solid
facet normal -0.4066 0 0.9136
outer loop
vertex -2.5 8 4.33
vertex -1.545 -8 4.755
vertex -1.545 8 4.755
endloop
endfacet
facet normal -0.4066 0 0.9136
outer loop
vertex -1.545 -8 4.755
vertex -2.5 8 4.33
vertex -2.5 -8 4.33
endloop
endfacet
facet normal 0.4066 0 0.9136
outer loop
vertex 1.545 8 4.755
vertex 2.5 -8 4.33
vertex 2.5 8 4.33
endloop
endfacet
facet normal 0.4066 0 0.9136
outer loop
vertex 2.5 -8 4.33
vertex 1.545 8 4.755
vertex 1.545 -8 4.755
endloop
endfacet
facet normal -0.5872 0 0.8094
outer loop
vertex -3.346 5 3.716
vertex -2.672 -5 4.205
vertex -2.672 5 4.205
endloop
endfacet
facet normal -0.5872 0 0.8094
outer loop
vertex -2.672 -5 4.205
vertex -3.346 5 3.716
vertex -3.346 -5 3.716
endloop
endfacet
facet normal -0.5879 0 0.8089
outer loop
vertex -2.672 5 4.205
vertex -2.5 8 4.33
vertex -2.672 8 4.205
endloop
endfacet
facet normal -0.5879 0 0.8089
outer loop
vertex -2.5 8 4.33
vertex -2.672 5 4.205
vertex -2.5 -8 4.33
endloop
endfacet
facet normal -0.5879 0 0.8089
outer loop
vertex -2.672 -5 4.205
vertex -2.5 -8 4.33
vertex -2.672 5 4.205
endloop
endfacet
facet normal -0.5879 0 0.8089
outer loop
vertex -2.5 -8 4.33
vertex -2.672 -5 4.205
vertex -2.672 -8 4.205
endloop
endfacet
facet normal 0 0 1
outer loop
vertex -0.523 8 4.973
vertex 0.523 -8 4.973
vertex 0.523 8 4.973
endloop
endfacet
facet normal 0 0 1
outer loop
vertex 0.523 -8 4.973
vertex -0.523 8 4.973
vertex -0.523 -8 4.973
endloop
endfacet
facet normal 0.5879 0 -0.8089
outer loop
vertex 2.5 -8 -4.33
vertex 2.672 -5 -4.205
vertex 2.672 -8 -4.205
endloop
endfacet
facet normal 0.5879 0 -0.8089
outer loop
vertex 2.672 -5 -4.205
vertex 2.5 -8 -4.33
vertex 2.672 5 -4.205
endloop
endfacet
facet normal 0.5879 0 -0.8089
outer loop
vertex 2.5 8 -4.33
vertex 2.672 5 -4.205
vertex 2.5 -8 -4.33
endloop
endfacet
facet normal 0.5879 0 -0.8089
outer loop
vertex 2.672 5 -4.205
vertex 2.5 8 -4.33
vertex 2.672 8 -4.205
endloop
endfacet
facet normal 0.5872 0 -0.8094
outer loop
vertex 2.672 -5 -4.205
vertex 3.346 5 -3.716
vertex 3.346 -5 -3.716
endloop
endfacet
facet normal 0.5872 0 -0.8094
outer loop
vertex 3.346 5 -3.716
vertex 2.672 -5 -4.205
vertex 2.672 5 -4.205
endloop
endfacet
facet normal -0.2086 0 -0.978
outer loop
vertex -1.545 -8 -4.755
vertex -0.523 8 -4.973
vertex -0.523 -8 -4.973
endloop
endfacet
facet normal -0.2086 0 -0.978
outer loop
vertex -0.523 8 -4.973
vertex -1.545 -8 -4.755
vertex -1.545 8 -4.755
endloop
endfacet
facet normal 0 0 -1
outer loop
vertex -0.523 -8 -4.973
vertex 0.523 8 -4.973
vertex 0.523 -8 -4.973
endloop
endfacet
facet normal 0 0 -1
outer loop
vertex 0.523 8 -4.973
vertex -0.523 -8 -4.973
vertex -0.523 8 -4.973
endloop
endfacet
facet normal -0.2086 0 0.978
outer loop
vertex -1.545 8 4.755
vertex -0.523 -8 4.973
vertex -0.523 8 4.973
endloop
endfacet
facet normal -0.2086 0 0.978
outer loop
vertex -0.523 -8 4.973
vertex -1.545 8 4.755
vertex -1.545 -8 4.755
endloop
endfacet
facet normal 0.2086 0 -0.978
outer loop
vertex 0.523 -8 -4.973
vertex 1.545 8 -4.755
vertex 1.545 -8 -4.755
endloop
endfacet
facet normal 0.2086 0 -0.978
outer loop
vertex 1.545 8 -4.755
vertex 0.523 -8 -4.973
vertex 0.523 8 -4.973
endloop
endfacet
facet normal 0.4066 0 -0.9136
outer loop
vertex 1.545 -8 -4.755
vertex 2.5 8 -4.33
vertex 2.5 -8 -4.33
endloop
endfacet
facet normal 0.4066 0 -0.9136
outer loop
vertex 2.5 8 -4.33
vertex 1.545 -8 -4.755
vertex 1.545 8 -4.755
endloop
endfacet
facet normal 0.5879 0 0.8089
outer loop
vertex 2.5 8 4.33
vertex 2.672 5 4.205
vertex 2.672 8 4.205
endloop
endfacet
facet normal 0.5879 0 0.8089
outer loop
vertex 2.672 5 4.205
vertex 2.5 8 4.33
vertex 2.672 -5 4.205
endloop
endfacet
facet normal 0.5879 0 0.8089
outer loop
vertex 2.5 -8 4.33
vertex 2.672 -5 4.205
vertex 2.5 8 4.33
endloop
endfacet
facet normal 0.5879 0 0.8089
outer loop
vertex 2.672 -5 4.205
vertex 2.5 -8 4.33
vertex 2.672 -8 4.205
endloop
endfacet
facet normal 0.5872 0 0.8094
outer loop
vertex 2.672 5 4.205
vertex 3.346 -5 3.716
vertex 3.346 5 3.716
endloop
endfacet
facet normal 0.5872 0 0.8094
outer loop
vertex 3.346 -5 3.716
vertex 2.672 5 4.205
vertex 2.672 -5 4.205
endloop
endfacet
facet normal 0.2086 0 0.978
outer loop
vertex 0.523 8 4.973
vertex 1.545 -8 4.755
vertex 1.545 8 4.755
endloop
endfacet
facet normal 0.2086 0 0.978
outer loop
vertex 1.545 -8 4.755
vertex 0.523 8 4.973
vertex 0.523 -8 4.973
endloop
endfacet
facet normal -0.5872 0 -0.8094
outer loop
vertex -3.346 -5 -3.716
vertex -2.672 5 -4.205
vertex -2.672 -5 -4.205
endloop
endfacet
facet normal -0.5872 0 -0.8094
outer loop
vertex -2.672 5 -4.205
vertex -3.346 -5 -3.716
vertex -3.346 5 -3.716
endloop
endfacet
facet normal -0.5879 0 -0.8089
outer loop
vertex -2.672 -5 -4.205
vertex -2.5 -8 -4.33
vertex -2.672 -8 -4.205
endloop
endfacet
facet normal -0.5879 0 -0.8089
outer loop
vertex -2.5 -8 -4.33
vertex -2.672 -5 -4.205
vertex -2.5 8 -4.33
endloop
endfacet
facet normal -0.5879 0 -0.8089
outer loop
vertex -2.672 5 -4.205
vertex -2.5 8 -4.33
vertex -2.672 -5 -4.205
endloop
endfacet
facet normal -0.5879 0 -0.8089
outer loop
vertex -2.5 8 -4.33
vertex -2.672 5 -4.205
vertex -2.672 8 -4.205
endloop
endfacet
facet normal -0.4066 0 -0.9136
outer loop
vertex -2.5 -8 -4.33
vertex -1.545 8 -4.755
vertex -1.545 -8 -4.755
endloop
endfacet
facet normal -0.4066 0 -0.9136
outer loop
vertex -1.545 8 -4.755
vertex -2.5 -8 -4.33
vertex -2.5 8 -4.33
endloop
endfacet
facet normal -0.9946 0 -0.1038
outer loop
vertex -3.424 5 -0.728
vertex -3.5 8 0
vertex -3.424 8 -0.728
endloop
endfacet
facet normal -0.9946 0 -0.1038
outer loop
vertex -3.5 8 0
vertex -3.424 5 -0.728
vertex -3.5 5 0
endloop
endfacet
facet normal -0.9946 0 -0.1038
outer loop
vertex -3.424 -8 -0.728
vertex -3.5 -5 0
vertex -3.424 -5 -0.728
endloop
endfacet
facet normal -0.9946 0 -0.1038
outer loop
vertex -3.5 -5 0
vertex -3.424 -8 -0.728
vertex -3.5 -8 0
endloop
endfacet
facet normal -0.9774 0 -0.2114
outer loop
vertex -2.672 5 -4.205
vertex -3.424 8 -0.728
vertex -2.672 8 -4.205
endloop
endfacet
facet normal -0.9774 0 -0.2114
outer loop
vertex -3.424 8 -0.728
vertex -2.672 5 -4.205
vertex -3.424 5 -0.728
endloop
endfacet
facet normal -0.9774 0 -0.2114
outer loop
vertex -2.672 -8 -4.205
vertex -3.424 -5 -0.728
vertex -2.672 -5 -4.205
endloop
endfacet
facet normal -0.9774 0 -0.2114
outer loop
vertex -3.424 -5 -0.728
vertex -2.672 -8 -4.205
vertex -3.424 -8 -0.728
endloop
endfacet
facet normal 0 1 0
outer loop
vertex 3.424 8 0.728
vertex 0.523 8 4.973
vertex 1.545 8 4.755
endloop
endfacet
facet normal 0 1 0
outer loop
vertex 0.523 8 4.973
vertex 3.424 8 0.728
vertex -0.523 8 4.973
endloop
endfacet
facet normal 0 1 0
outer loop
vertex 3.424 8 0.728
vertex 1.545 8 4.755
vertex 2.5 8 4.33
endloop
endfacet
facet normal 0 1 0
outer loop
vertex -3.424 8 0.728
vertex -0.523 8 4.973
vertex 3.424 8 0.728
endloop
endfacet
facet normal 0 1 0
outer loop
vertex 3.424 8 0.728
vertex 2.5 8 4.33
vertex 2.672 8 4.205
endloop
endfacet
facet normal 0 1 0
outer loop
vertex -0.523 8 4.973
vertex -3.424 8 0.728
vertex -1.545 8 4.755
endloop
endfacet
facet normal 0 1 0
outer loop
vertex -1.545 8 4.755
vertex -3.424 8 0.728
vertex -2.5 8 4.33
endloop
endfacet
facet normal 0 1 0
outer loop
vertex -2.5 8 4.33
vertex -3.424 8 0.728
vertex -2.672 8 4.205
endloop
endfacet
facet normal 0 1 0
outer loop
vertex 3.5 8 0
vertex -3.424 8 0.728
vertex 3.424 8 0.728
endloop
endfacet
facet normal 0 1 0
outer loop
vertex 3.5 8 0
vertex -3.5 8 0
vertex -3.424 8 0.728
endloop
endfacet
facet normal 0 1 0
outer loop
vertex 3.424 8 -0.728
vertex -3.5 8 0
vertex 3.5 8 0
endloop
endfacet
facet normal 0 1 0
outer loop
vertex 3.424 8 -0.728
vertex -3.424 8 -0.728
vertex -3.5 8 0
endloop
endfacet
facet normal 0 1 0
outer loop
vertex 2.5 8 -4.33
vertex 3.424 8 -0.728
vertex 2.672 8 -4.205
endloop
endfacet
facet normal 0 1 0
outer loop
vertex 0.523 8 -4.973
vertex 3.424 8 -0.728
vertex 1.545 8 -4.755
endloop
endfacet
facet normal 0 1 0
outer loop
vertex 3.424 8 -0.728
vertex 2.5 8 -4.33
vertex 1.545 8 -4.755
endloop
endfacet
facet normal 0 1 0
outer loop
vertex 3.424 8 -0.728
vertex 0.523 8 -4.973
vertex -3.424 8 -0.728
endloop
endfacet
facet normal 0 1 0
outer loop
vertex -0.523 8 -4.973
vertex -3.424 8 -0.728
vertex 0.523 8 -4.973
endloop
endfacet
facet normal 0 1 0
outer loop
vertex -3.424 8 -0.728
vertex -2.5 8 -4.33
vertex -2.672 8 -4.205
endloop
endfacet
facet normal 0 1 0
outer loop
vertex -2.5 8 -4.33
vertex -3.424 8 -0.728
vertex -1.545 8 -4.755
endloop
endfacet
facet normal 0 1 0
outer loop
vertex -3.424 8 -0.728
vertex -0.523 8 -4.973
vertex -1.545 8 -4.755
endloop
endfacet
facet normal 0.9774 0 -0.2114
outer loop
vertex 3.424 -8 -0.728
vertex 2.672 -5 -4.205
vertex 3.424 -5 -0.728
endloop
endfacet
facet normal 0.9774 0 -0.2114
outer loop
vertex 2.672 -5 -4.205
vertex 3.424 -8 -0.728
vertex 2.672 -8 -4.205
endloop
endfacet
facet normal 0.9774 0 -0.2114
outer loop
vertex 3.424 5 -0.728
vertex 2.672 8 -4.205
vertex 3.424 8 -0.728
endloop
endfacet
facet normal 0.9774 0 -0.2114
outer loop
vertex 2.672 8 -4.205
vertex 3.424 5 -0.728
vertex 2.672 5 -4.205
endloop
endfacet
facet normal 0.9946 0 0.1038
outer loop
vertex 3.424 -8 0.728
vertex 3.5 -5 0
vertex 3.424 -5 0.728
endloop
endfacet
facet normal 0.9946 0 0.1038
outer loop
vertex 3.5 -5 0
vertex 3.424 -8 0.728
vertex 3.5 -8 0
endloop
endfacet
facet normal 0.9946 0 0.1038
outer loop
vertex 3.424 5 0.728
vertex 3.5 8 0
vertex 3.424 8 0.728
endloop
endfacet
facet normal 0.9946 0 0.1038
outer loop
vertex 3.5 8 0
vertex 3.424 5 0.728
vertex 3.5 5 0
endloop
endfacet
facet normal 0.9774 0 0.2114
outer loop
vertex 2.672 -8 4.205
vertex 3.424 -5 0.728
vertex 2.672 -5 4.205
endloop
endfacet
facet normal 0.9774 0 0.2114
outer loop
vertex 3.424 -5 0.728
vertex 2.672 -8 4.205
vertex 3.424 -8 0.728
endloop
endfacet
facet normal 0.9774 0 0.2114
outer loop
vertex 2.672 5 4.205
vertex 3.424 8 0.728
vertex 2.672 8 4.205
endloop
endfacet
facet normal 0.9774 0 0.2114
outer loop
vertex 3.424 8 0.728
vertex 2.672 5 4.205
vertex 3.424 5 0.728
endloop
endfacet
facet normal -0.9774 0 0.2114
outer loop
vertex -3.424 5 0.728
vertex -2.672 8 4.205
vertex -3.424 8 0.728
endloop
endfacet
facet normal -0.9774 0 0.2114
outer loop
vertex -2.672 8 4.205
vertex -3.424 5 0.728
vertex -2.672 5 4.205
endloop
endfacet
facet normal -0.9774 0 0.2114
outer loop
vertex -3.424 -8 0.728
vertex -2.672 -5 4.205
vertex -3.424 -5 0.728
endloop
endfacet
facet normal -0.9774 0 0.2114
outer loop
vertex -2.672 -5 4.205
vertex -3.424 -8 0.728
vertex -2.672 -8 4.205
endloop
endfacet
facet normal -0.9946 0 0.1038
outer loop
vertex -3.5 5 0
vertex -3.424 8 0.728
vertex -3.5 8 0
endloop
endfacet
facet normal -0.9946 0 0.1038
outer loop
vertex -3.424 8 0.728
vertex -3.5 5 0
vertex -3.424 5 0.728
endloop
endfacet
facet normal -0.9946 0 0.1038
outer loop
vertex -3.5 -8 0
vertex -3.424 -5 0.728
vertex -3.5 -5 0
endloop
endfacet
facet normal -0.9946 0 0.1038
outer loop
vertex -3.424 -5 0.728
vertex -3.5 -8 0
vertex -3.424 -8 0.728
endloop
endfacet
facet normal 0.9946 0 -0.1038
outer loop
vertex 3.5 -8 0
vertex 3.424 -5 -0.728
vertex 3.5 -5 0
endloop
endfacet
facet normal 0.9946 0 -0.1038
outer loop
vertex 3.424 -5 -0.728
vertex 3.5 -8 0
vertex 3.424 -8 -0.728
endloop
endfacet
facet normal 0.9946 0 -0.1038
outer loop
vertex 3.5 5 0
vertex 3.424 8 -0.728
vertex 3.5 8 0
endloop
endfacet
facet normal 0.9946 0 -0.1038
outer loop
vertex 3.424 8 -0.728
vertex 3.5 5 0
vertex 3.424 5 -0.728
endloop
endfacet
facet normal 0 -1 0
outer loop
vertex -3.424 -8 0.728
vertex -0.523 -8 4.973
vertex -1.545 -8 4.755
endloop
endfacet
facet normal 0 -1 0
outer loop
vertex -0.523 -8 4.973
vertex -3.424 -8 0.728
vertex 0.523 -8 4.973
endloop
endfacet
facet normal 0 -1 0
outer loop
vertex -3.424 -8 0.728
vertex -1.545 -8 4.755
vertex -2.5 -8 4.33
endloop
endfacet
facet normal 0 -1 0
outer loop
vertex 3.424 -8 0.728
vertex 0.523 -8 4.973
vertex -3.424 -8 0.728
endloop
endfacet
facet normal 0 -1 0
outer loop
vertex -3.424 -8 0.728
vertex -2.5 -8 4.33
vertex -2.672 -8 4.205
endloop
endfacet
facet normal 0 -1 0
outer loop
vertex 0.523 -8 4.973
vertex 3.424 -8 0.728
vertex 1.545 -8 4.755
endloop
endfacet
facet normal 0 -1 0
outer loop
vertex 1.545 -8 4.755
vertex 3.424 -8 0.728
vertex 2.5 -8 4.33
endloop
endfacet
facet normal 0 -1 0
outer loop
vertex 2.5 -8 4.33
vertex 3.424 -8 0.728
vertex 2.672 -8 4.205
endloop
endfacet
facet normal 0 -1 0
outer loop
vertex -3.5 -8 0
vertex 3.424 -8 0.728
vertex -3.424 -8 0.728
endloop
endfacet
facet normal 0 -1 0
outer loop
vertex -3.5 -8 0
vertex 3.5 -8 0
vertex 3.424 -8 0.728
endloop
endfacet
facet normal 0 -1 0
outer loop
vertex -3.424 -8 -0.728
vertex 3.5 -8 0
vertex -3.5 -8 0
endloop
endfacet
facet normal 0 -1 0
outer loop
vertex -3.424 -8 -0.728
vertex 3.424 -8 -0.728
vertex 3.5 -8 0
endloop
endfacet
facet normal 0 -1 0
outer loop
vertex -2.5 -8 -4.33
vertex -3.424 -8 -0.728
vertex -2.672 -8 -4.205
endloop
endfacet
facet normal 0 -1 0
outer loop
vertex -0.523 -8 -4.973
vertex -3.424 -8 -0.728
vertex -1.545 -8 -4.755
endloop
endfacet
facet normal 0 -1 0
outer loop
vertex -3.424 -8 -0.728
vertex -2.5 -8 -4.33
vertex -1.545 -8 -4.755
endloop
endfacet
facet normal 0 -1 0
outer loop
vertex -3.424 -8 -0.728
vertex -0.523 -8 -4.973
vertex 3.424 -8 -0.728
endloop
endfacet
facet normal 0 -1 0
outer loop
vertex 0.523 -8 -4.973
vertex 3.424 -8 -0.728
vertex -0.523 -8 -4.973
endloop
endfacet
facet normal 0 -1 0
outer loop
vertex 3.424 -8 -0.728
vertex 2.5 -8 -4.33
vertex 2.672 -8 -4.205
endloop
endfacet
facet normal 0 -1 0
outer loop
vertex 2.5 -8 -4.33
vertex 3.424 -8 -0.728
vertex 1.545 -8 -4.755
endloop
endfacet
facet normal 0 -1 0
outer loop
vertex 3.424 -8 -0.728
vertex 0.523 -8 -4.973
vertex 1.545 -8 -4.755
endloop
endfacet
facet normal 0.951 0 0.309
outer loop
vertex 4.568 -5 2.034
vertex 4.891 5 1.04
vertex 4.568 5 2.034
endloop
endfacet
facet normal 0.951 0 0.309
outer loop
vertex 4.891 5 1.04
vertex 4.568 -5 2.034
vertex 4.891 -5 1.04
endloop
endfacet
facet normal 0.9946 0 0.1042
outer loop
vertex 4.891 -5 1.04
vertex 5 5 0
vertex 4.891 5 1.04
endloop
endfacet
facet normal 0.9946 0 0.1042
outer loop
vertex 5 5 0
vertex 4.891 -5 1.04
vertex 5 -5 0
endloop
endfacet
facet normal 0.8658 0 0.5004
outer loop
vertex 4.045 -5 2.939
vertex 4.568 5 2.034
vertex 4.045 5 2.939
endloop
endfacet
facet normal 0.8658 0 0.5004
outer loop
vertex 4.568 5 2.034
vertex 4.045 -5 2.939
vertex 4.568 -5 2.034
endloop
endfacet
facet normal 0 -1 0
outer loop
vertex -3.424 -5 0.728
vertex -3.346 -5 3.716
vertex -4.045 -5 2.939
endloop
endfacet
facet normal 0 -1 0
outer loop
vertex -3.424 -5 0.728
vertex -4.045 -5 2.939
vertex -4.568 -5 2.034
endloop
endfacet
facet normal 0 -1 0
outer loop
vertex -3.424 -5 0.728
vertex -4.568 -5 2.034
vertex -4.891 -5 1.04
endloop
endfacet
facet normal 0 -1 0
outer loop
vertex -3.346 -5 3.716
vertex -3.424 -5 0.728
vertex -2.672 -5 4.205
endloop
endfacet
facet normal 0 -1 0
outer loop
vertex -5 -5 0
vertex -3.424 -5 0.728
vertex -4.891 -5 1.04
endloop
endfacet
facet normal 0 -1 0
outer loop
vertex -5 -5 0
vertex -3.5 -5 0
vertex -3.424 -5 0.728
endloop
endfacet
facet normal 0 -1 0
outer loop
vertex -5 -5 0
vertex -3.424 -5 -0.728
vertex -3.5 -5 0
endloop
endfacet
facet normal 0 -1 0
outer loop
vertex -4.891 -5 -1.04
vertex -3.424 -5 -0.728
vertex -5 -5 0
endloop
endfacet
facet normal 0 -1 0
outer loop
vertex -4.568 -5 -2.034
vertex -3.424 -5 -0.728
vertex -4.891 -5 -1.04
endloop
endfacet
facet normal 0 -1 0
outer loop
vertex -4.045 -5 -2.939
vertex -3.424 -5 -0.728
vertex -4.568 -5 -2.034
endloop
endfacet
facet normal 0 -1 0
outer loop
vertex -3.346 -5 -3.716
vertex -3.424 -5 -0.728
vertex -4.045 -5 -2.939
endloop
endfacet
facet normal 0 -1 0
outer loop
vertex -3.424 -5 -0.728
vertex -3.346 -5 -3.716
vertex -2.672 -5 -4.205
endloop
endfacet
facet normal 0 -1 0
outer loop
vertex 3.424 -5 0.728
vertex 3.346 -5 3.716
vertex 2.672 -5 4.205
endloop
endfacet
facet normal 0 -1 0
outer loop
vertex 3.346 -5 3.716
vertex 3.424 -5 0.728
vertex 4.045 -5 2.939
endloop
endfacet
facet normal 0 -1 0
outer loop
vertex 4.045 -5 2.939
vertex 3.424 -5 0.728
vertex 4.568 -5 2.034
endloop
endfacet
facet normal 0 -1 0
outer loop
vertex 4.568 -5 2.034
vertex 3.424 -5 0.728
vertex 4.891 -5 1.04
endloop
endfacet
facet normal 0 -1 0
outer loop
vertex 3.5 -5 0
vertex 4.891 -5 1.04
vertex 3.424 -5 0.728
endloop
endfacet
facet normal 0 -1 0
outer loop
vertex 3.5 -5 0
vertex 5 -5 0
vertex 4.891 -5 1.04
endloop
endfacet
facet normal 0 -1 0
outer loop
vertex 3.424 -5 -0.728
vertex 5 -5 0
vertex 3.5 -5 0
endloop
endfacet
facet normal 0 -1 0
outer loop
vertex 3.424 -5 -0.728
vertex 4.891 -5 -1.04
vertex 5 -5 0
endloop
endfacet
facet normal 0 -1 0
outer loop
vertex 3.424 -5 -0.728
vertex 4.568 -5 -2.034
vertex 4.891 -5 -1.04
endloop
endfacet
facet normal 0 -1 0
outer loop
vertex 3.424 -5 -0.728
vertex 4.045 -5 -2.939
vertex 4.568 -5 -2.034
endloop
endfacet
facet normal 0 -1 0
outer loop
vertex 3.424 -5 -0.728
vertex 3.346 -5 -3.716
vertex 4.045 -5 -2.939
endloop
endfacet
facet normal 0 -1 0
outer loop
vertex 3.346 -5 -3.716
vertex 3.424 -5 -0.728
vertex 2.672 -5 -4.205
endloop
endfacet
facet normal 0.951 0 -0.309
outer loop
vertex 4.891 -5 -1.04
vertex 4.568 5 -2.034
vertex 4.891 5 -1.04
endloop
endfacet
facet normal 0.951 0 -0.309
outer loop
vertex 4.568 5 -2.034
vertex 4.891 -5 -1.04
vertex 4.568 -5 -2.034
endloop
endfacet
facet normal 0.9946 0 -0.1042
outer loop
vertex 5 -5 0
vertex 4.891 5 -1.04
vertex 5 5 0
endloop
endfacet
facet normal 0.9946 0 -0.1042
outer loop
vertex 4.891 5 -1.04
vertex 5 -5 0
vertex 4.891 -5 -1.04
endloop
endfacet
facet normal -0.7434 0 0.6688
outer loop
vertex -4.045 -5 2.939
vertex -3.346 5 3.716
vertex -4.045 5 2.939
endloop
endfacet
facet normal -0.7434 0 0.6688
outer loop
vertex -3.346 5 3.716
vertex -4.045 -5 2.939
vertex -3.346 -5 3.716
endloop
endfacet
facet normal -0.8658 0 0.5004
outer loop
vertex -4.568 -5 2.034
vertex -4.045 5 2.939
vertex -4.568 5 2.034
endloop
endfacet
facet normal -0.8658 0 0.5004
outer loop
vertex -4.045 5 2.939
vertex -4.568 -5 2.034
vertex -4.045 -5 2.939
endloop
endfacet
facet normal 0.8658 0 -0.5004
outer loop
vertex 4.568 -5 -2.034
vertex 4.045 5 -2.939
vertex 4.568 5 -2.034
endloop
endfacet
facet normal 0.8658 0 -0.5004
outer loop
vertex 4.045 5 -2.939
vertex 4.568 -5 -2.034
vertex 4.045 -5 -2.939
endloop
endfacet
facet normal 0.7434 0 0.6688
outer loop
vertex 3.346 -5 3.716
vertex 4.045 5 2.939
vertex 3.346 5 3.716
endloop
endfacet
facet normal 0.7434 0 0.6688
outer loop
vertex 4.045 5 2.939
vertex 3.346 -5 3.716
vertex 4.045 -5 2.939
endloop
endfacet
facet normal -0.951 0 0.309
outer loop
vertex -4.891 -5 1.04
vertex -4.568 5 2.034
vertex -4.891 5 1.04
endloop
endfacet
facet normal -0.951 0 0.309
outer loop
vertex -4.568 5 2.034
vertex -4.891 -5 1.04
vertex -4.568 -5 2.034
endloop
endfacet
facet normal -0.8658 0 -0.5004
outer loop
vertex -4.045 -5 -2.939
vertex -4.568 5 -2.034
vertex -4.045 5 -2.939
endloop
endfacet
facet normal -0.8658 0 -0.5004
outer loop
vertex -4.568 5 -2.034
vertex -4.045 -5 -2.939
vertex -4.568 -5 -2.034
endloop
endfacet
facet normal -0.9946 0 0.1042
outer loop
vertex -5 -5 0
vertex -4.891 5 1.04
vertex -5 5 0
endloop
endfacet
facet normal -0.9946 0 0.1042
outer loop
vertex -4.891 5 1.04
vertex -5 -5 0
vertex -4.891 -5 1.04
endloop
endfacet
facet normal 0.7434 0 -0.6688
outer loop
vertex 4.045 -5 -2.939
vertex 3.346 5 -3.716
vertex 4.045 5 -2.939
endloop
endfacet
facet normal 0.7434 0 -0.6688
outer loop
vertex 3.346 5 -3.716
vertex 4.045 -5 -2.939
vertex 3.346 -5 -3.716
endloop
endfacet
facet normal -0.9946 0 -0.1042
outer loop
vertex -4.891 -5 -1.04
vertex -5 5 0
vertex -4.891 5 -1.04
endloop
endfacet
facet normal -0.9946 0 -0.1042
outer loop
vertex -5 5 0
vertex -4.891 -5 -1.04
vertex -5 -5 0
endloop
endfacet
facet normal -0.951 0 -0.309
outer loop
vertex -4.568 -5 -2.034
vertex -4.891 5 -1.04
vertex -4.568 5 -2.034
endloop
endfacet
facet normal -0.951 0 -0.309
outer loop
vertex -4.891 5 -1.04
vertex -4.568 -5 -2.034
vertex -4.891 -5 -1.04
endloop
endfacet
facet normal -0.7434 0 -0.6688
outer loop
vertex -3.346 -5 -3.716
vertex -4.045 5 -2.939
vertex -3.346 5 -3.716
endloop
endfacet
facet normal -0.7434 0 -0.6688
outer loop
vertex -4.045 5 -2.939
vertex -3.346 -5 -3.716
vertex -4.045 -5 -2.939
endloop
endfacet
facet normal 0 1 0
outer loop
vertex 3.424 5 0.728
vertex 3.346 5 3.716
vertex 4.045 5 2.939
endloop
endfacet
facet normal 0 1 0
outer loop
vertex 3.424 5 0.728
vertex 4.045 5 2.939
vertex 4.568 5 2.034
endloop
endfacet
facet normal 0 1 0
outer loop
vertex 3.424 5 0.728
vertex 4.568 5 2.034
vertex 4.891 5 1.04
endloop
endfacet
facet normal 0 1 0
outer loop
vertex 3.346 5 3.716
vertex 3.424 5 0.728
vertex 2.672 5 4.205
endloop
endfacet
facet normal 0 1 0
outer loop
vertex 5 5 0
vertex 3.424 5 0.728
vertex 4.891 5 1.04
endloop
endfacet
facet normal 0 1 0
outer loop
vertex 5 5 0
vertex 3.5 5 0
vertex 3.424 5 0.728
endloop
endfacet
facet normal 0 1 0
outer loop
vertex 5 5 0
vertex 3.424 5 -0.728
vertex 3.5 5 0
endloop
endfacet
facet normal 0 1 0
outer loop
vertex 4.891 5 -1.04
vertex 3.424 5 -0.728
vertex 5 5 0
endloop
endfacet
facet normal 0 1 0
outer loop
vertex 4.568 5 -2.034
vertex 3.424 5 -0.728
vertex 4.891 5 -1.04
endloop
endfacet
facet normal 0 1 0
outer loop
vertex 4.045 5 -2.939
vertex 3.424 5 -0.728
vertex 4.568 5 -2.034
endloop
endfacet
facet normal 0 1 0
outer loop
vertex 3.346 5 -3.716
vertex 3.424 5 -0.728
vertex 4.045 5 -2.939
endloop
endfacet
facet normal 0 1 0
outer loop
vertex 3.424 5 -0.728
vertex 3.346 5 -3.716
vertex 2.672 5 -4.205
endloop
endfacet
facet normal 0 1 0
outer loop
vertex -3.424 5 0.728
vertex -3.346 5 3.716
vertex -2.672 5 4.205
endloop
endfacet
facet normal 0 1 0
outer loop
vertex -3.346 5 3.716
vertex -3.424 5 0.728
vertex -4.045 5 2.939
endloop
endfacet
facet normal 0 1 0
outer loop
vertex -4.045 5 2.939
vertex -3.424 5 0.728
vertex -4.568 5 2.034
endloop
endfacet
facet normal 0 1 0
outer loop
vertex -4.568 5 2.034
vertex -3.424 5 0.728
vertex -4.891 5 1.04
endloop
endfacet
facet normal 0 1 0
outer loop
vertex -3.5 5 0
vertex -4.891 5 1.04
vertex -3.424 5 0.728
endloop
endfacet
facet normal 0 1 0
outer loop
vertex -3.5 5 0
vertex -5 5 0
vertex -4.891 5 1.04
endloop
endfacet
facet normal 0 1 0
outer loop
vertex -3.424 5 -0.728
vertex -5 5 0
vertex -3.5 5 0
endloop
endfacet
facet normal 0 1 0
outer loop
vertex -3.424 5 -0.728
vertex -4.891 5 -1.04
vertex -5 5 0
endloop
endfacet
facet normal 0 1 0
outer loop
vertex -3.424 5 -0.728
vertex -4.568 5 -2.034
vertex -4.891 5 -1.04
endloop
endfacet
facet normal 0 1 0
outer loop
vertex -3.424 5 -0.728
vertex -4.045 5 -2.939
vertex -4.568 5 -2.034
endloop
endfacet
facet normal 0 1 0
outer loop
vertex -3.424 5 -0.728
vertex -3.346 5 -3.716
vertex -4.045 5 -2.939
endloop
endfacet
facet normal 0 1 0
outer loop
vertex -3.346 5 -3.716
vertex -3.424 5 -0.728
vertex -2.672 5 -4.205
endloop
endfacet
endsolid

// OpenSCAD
$fs=0.5;

module servo_connection_rod() {
    difference() {
        hull(){
            cube([5,10,16],center=true);
            translate([0,0,-8])
            cylinder(r=3.5, h=16);
        }
        translate([0,0,-10])
        difference() {
            cylinder(r=10, h=20);
            cylinder(r=5, h=20);
        }
    }
    translate([0,0,-5])
    cylinder(r=5, h=10);
}

rotate([90,0,0])
servo_connection_rod();
